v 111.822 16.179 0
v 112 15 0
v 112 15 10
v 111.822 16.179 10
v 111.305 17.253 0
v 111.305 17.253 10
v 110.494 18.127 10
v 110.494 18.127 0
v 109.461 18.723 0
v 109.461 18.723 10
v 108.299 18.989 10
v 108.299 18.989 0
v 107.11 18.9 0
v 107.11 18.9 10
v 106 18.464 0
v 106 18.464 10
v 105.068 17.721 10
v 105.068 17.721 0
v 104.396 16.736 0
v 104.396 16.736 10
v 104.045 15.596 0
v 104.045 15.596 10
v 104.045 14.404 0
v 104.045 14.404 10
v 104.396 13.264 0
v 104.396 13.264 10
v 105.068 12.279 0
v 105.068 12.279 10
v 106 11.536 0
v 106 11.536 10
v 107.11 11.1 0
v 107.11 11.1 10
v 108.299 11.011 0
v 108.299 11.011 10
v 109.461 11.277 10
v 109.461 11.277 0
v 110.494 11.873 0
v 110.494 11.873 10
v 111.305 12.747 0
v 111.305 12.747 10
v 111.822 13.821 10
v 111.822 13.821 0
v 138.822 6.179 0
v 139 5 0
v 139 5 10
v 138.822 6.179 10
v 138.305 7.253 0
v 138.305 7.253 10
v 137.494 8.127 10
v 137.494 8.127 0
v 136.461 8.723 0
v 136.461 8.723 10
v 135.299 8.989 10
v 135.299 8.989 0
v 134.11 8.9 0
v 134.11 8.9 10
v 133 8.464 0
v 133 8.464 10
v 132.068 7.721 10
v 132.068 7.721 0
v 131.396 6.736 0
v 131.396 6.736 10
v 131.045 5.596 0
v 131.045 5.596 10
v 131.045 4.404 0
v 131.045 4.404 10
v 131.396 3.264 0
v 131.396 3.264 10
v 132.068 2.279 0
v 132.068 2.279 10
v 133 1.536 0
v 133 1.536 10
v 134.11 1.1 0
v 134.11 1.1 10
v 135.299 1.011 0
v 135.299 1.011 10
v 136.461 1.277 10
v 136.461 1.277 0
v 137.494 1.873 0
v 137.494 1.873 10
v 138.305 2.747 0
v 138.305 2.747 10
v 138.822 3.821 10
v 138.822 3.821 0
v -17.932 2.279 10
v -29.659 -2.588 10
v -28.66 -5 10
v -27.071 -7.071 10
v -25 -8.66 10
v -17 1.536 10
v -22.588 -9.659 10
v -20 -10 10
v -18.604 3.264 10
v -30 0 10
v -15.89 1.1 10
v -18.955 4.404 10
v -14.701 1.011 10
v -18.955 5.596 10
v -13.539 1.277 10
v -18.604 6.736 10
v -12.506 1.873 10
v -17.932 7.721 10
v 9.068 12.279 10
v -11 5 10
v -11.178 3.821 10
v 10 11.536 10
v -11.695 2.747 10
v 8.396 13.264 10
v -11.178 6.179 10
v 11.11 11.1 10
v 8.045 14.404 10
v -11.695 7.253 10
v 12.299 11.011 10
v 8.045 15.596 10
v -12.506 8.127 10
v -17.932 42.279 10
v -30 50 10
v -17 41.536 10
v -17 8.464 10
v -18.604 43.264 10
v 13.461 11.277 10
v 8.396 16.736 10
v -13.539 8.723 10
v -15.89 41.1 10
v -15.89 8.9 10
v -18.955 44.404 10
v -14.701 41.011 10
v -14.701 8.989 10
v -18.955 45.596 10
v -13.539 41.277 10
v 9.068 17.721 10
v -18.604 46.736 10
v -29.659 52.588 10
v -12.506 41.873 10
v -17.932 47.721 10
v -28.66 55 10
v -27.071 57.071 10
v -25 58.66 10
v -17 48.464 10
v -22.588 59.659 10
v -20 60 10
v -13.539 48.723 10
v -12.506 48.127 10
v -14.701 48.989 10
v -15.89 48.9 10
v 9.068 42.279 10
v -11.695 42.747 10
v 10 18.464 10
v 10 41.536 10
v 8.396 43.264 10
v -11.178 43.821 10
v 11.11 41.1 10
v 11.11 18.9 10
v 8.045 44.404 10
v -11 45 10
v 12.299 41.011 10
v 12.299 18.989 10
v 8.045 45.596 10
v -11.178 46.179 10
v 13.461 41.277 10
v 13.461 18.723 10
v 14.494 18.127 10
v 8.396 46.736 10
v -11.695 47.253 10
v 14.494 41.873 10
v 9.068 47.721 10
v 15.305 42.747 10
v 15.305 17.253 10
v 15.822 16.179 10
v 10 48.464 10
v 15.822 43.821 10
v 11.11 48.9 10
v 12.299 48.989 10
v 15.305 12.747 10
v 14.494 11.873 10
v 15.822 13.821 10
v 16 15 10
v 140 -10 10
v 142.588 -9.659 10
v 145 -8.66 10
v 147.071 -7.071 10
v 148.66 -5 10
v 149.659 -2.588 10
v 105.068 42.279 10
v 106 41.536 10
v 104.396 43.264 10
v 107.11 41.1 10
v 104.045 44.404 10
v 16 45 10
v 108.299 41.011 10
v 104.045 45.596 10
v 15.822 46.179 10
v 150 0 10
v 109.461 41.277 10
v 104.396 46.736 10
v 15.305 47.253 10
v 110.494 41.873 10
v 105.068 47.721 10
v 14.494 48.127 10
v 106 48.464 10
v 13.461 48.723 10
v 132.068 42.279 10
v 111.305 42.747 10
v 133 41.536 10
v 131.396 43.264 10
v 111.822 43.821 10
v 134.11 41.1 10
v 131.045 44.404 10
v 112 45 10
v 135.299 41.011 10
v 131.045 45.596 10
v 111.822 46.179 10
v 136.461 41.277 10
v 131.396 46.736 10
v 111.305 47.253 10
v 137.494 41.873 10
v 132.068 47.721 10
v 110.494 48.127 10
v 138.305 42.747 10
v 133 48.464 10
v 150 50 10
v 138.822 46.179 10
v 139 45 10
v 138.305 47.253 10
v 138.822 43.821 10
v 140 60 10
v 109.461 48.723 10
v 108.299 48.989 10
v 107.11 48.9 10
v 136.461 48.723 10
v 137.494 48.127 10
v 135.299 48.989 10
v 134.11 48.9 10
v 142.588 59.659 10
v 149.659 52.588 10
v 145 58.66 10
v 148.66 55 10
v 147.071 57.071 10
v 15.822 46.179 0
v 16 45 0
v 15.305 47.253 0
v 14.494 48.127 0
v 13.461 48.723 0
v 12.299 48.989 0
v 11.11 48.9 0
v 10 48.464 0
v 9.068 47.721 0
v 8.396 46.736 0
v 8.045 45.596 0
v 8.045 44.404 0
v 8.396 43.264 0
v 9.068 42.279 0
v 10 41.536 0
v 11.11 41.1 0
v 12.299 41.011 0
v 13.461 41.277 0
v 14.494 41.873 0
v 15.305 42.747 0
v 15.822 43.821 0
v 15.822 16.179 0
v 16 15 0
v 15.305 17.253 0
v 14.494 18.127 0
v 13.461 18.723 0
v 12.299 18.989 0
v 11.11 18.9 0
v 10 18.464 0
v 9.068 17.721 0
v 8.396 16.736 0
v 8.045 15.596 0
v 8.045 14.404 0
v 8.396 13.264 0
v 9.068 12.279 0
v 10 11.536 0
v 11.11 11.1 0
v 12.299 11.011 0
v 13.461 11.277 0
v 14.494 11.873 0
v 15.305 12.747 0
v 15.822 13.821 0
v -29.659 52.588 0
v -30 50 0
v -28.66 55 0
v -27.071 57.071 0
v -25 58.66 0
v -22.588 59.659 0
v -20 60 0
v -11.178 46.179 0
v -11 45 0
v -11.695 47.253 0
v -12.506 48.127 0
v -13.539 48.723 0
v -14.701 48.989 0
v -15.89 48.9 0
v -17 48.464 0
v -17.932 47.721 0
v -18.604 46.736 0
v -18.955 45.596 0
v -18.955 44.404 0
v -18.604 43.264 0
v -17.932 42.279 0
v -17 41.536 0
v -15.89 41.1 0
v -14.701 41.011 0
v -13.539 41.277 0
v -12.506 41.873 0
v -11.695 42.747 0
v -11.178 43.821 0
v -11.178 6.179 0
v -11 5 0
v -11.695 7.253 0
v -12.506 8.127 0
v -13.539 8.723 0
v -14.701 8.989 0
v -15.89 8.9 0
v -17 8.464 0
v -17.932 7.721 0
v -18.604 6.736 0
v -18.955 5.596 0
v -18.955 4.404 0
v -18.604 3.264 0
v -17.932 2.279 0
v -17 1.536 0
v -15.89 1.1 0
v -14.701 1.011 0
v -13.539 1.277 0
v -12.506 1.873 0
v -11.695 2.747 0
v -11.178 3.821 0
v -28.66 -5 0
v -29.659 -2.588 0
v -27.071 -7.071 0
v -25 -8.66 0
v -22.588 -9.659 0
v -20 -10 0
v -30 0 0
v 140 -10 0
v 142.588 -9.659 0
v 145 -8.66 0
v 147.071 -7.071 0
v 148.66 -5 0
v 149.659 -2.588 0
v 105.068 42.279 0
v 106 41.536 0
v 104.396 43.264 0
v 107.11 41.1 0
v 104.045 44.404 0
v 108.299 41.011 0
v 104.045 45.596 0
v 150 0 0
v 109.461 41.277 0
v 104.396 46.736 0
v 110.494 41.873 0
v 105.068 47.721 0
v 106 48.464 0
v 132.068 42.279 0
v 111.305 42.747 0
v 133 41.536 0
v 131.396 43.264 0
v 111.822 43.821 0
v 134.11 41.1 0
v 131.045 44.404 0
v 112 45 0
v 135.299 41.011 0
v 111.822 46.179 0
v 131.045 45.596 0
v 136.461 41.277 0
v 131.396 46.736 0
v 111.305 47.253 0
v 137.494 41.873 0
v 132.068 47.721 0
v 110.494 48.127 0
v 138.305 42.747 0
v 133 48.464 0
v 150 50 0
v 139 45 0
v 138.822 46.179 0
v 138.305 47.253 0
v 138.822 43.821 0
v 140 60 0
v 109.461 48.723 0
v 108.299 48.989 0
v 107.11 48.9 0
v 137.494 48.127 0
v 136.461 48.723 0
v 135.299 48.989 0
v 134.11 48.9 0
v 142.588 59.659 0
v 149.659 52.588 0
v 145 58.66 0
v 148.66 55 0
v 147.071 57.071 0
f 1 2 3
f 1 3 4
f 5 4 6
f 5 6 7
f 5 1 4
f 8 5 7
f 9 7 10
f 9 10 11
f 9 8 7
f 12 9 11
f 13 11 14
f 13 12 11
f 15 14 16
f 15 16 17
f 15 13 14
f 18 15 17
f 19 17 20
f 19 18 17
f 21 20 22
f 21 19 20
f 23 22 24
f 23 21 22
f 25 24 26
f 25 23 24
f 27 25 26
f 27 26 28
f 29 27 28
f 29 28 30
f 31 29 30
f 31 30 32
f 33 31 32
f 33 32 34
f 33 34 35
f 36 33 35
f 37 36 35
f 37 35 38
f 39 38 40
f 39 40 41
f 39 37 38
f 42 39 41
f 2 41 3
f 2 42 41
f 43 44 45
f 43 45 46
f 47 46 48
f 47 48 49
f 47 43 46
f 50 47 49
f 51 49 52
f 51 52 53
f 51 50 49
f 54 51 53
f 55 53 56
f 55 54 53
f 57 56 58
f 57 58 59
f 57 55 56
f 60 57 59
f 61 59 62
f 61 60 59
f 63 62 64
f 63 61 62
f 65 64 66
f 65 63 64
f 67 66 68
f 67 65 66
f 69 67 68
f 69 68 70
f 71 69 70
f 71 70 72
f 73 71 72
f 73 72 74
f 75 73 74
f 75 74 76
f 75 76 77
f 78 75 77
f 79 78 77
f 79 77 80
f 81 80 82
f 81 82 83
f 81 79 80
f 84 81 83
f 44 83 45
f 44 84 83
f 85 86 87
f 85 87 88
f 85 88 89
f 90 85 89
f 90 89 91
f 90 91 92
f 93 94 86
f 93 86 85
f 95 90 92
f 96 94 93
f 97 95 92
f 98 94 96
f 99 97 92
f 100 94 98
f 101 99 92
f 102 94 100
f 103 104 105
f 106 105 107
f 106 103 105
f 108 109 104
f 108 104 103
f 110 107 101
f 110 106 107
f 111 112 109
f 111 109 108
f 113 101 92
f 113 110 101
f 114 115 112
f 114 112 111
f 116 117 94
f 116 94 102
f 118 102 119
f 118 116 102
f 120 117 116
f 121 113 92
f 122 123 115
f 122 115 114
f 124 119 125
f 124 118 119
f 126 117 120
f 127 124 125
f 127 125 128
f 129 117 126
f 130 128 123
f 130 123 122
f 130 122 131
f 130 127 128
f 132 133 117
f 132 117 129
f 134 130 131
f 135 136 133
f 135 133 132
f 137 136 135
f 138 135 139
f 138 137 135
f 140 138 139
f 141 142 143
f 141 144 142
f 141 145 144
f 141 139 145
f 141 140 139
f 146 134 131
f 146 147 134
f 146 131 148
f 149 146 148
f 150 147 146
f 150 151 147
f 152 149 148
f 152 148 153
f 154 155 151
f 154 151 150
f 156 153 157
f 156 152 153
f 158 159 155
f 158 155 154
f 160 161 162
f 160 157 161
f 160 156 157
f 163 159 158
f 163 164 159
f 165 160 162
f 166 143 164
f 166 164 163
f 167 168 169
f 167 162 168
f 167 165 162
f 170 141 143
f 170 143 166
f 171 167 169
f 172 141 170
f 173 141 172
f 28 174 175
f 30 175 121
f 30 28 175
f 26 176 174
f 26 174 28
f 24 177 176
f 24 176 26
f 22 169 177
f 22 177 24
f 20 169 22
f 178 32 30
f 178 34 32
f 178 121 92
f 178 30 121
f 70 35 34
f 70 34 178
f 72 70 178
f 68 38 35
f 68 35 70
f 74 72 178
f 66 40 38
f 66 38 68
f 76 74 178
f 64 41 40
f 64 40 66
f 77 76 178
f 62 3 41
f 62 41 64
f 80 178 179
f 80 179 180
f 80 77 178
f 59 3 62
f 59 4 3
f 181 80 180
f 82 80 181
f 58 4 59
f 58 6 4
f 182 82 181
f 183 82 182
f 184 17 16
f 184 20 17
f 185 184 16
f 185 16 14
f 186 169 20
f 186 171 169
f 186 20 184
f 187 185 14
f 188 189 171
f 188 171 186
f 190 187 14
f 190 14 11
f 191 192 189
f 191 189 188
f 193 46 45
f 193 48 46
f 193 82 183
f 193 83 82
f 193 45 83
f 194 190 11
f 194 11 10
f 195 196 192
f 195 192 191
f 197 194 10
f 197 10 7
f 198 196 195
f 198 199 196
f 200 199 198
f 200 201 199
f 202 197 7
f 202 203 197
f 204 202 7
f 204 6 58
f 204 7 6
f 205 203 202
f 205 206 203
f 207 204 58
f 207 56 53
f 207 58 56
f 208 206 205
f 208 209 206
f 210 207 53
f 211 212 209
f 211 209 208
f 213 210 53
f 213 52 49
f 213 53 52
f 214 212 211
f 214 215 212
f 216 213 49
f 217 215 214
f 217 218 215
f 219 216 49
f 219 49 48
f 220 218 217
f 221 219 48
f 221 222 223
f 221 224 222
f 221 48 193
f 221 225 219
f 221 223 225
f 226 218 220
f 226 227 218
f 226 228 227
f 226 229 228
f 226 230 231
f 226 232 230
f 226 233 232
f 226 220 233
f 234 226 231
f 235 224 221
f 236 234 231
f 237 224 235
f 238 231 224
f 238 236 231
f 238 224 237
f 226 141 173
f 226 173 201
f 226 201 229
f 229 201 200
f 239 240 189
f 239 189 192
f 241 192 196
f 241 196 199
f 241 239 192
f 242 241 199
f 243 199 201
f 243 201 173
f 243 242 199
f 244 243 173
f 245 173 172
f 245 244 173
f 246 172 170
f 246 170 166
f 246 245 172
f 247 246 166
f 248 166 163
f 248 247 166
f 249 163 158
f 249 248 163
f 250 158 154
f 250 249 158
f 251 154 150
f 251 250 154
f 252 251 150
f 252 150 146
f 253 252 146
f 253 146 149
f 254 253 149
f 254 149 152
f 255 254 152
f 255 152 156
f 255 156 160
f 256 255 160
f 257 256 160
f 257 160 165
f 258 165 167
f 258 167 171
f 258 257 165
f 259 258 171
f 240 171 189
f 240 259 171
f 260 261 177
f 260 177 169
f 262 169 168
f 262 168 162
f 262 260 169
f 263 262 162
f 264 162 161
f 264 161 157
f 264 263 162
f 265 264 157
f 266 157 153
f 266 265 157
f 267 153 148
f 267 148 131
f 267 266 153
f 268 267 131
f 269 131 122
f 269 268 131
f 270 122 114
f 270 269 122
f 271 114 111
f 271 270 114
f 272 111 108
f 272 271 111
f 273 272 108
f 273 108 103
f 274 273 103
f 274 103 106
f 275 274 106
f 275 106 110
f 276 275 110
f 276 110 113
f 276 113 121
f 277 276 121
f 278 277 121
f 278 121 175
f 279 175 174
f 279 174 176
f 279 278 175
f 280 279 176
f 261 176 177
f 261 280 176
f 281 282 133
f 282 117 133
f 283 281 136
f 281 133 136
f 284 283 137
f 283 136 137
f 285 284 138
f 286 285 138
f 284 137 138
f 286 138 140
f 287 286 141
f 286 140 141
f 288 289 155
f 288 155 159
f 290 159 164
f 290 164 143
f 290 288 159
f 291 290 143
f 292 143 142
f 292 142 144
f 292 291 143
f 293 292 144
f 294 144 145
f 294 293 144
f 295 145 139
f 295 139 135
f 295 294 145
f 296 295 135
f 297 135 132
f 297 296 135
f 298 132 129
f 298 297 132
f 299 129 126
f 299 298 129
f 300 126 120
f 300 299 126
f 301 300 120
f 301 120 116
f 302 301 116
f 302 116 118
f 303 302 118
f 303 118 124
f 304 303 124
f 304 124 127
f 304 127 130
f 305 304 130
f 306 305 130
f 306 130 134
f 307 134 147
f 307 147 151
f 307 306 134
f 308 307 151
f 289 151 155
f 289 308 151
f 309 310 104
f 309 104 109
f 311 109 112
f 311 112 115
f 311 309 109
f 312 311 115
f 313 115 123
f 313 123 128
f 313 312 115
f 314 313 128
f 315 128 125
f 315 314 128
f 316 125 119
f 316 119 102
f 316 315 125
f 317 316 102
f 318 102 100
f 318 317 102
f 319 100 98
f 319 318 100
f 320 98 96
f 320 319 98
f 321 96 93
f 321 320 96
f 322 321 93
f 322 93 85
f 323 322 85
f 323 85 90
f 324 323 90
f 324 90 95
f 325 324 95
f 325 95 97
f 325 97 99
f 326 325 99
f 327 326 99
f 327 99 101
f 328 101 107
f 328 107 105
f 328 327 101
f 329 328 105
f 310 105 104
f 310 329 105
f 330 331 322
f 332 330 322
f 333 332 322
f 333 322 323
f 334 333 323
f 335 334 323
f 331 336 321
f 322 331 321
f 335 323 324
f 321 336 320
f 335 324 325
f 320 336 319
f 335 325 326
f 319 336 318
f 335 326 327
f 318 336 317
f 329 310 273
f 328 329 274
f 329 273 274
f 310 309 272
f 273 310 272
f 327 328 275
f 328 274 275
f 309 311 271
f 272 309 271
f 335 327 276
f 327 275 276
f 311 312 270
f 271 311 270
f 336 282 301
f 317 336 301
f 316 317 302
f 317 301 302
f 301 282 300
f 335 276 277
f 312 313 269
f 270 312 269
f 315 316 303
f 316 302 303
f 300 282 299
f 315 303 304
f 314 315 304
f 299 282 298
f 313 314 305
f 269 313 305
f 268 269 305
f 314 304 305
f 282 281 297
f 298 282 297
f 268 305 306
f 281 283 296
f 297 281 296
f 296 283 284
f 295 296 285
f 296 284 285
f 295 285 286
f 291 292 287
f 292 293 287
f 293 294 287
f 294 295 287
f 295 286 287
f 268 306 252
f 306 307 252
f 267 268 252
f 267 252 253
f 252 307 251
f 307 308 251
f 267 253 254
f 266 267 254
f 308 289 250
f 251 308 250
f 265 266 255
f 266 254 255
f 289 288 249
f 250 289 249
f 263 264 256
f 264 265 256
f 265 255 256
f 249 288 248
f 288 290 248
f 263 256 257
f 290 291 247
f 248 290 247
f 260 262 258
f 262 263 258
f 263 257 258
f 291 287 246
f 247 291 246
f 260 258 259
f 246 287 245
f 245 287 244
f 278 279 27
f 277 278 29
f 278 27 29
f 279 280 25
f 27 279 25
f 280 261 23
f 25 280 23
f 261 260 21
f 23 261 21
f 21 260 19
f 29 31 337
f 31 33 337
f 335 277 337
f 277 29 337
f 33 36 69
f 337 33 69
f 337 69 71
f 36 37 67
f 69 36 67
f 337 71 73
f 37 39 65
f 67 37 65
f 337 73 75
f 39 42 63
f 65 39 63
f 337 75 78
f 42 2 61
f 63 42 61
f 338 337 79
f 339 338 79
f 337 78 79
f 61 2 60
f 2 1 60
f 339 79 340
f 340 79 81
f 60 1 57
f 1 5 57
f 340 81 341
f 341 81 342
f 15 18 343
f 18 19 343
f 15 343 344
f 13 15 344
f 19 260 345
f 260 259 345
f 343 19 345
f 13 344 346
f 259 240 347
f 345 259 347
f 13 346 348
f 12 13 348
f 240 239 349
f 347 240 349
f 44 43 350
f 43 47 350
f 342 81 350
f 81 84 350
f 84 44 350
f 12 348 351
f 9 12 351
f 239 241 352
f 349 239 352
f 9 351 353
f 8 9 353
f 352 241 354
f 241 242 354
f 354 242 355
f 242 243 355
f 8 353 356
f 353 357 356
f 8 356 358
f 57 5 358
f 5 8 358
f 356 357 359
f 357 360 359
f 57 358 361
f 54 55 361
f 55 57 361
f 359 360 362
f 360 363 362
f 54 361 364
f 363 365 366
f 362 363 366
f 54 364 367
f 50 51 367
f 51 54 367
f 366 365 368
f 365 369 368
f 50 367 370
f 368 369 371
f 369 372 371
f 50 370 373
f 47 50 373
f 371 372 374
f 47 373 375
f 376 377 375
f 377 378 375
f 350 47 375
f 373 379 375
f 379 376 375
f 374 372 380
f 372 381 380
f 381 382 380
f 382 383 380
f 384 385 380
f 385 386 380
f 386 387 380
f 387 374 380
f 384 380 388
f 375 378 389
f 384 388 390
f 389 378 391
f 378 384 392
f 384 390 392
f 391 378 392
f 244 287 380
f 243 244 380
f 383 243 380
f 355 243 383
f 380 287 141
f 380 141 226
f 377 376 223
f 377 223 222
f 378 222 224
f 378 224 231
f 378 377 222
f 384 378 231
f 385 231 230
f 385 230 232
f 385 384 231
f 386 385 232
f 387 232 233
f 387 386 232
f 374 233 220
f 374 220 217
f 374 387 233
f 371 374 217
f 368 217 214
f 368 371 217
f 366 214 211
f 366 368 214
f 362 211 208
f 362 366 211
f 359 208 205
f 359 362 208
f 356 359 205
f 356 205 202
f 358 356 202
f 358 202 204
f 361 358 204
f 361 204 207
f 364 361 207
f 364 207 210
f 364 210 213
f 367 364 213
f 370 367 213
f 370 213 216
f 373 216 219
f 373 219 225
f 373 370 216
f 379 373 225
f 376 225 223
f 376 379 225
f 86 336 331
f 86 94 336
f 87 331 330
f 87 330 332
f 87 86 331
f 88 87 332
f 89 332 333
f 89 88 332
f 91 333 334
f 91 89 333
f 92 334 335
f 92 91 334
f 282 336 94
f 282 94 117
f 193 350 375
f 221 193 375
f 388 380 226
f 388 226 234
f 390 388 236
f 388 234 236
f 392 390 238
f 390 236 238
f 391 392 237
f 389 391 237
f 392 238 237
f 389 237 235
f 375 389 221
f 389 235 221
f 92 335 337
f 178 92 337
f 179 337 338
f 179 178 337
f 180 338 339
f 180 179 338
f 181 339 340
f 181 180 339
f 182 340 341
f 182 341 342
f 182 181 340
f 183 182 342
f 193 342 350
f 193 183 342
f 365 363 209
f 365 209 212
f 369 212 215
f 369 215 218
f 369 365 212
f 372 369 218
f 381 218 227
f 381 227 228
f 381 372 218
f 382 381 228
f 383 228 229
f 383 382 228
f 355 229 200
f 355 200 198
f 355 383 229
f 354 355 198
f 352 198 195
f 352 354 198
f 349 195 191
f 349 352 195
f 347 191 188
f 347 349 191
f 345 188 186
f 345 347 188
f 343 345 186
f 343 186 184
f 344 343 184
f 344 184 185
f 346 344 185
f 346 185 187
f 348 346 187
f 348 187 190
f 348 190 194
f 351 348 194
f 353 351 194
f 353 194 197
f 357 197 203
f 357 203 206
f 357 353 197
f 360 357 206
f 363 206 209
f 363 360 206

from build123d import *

# Parameters (mm, degrees)
SKETCH_W  = 180
SKETCH_H  = 70
SKETCH_R  = 4
PAD_DEPTH = 10
FILLET_R  = 10


with BuildPart() as part:
    # Sketch → Pad (new body)
    with BuildSketch(Plane.XY):
        with Locations((60, 25)):
            Rectangle(SKETCH_W, SKETCH_H)
        with Locations((-15, 45)):
            Circle(SKETCH_R, mode=Mode.SUBTRACT)
        with Locations((135, 45)):
            Circle(SKETCH_R, mode=Mode.SUBTRACT)
        with Locations((-15, 5)):
            Circle(SKETCH_R, mode=Mode.SUBTRACT)
        with Locations((135, 5)):
            Circle(SKETCH_R, mode=Mode.SUBTRACT)
        with Locations((12, 45)):
            Circle(SKETCH_R, mode=Mode.SUBTRACT)
        with Locations((108, 45)):
            Circle(SKETCH_R, mode=Mode.SUBTRACT)
        with Locations((12, 15)):
            Circle(SKETCH_R, mode=Mode.SUBTRACT)
        with Locations((108, 15)):
            Circle(SKETCH_R, mode=Mode.SUBTRACT)
    extrude(amount=PAD_DEPTH)

    # Fillet
    fillet_edges = [part.edges().sort_by_distance(p)[0] for p in [
        (-30, -10, 5),
        (-30, 60, 5),
        (150, -10, 5),
        (150, 60, 5),
    ]]
    fillet(fillet_edges, radius=FILLET_R)


solid = part.part
